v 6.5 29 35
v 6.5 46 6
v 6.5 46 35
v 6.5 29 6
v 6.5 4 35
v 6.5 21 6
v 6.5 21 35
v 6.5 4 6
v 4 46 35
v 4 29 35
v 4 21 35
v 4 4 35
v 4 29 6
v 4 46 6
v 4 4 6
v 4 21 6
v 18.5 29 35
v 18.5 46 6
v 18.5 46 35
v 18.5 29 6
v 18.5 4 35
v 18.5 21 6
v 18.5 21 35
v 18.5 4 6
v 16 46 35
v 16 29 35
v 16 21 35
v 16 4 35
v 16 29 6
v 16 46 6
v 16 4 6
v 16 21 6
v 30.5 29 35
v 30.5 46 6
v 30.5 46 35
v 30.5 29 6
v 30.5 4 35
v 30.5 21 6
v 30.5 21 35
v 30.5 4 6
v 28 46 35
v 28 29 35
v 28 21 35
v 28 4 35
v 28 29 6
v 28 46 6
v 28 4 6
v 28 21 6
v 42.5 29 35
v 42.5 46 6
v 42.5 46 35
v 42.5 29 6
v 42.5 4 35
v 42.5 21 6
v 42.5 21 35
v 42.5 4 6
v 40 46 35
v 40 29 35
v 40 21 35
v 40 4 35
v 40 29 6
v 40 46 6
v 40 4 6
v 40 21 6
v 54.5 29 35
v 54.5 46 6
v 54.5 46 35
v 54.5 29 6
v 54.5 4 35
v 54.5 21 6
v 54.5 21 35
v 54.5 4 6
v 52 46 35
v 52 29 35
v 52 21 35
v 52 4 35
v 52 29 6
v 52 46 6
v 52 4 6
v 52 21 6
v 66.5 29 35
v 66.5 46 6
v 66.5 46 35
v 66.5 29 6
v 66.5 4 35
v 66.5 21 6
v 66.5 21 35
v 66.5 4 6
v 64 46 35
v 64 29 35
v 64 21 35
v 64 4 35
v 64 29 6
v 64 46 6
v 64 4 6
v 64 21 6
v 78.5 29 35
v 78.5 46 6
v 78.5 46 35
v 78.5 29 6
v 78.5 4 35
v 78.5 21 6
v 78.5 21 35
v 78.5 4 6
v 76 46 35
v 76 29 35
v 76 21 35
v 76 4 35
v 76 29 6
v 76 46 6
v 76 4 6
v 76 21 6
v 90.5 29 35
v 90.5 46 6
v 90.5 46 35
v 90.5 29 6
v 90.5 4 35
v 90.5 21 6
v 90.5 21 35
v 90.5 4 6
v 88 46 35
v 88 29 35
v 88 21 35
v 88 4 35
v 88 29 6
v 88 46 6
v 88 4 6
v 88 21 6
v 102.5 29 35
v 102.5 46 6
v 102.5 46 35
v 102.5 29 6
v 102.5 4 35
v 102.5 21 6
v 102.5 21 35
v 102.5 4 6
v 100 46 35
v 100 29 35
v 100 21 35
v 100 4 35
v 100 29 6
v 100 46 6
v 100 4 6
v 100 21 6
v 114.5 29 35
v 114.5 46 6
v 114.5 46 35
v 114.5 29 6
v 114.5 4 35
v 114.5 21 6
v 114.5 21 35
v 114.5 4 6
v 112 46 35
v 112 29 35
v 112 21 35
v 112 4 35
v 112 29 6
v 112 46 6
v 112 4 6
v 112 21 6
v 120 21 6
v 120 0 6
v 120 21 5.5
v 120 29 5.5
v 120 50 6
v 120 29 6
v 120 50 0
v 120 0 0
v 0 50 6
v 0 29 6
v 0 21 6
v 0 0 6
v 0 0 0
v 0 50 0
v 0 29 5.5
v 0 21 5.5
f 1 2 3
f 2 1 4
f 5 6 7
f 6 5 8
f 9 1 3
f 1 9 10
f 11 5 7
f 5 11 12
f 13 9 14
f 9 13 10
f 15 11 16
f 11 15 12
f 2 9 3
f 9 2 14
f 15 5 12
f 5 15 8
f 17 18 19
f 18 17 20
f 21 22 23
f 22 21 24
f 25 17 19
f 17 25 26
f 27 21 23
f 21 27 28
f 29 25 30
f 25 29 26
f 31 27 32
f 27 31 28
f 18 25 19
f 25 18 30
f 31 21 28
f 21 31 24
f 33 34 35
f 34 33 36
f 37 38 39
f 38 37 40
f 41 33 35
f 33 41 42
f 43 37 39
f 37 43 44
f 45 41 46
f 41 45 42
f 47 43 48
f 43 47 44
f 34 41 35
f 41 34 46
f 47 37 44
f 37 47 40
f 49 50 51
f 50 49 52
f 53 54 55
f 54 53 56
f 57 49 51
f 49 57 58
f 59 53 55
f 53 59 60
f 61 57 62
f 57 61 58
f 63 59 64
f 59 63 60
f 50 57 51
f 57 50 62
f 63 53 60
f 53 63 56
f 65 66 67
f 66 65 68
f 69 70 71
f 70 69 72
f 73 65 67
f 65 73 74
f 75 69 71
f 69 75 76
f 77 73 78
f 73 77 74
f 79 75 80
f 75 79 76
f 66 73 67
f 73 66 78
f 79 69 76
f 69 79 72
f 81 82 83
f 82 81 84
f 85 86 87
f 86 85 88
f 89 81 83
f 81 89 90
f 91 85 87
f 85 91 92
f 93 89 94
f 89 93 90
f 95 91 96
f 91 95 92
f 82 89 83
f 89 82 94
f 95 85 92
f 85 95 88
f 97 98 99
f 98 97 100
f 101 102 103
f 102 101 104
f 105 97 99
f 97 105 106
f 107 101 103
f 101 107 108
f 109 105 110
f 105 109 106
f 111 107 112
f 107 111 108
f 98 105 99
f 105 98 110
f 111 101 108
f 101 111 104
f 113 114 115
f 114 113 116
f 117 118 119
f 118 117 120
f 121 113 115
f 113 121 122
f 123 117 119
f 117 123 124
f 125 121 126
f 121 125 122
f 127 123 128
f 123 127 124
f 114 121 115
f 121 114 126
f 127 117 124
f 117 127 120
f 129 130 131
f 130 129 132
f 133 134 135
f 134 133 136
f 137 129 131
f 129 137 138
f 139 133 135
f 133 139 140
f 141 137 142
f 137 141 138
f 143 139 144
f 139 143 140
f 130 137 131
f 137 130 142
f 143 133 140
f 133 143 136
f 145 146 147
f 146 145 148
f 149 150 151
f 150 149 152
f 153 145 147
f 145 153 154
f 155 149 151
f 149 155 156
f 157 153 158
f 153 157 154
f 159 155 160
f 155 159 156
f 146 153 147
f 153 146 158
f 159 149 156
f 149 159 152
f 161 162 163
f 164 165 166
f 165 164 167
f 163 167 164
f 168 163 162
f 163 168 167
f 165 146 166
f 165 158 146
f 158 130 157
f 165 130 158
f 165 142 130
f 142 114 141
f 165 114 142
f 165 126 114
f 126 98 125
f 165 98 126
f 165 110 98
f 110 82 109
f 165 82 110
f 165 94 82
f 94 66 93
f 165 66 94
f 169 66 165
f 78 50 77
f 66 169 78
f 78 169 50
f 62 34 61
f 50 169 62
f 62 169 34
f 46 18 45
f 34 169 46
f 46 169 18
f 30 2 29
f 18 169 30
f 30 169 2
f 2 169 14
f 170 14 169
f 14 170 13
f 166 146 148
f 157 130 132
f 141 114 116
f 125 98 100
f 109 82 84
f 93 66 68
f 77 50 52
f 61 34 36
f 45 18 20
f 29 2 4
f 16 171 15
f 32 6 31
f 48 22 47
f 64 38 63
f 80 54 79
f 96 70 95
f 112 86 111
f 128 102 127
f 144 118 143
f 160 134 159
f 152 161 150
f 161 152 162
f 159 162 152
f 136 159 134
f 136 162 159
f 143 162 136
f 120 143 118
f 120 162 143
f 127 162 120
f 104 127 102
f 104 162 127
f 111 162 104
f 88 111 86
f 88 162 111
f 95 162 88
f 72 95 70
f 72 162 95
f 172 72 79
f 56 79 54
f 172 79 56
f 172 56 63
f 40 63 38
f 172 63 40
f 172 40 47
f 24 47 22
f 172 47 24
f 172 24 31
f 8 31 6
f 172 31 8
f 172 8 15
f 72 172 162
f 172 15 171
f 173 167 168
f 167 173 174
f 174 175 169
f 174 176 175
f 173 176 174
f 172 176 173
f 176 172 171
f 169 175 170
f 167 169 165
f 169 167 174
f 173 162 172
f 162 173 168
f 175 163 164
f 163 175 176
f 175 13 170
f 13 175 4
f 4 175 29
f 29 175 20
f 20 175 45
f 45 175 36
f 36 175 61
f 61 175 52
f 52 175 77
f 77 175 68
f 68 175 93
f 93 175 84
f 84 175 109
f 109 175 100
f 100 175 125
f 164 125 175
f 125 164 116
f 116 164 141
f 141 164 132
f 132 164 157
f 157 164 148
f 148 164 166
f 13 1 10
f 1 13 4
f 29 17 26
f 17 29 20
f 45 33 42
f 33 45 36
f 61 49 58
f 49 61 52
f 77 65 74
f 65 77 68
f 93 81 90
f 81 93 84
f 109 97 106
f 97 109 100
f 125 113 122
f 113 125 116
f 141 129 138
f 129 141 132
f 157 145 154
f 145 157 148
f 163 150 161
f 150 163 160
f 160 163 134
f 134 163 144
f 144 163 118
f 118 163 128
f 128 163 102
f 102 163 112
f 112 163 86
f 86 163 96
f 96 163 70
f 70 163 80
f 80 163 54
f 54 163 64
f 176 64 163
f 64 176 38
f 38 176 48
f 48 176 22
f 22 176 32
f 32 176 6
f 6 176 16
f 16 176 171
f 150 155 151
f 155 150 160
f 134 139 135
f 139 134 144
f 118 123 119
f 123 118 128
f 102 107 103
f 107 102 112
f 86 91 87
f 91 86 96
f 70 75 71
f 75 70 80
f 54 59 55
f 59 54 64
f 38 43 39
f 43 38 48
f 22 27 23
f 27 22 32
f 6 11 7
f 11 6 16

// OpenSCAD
$fn = 32;

// ----------------------------------------------------------------------
// Heatsink: slotted fin block
// ----------------------------------------------------------------------

// --- parameters (mm) ---
base_l = 120;             // base length, X
base_w = 50;              // base width, Y
base_t = 6;               // base plate thickness
fin_h = 30;               // fin height above the base
fin_t = 2.5;              // fin thickness
edge = 4;                 // margin from the base ends
pitch = 12;               // fin pitch
slot_w = 8;               // central slot width, Y

n_fins = floor((base_l - 2 * edge - fin_t) / pitch) + 1;  // fin count
total_h = base_t + fin_h - 1;  // overall height

difference() {
union() {
  cube([base_l, base_w, base_t]);
  for (i = [0 : n_fins - 1])
    translate([edge + i * pitch, edge, base_t - 1])
      cube([fin_t, base_w - 2 * edge, fin_h]);
}
  translate([-1, base_w / 2 - slot_w / 2, base_t - 0.5])
    cube([base_l + 2, slot_w, fin_h + 2]);
}
